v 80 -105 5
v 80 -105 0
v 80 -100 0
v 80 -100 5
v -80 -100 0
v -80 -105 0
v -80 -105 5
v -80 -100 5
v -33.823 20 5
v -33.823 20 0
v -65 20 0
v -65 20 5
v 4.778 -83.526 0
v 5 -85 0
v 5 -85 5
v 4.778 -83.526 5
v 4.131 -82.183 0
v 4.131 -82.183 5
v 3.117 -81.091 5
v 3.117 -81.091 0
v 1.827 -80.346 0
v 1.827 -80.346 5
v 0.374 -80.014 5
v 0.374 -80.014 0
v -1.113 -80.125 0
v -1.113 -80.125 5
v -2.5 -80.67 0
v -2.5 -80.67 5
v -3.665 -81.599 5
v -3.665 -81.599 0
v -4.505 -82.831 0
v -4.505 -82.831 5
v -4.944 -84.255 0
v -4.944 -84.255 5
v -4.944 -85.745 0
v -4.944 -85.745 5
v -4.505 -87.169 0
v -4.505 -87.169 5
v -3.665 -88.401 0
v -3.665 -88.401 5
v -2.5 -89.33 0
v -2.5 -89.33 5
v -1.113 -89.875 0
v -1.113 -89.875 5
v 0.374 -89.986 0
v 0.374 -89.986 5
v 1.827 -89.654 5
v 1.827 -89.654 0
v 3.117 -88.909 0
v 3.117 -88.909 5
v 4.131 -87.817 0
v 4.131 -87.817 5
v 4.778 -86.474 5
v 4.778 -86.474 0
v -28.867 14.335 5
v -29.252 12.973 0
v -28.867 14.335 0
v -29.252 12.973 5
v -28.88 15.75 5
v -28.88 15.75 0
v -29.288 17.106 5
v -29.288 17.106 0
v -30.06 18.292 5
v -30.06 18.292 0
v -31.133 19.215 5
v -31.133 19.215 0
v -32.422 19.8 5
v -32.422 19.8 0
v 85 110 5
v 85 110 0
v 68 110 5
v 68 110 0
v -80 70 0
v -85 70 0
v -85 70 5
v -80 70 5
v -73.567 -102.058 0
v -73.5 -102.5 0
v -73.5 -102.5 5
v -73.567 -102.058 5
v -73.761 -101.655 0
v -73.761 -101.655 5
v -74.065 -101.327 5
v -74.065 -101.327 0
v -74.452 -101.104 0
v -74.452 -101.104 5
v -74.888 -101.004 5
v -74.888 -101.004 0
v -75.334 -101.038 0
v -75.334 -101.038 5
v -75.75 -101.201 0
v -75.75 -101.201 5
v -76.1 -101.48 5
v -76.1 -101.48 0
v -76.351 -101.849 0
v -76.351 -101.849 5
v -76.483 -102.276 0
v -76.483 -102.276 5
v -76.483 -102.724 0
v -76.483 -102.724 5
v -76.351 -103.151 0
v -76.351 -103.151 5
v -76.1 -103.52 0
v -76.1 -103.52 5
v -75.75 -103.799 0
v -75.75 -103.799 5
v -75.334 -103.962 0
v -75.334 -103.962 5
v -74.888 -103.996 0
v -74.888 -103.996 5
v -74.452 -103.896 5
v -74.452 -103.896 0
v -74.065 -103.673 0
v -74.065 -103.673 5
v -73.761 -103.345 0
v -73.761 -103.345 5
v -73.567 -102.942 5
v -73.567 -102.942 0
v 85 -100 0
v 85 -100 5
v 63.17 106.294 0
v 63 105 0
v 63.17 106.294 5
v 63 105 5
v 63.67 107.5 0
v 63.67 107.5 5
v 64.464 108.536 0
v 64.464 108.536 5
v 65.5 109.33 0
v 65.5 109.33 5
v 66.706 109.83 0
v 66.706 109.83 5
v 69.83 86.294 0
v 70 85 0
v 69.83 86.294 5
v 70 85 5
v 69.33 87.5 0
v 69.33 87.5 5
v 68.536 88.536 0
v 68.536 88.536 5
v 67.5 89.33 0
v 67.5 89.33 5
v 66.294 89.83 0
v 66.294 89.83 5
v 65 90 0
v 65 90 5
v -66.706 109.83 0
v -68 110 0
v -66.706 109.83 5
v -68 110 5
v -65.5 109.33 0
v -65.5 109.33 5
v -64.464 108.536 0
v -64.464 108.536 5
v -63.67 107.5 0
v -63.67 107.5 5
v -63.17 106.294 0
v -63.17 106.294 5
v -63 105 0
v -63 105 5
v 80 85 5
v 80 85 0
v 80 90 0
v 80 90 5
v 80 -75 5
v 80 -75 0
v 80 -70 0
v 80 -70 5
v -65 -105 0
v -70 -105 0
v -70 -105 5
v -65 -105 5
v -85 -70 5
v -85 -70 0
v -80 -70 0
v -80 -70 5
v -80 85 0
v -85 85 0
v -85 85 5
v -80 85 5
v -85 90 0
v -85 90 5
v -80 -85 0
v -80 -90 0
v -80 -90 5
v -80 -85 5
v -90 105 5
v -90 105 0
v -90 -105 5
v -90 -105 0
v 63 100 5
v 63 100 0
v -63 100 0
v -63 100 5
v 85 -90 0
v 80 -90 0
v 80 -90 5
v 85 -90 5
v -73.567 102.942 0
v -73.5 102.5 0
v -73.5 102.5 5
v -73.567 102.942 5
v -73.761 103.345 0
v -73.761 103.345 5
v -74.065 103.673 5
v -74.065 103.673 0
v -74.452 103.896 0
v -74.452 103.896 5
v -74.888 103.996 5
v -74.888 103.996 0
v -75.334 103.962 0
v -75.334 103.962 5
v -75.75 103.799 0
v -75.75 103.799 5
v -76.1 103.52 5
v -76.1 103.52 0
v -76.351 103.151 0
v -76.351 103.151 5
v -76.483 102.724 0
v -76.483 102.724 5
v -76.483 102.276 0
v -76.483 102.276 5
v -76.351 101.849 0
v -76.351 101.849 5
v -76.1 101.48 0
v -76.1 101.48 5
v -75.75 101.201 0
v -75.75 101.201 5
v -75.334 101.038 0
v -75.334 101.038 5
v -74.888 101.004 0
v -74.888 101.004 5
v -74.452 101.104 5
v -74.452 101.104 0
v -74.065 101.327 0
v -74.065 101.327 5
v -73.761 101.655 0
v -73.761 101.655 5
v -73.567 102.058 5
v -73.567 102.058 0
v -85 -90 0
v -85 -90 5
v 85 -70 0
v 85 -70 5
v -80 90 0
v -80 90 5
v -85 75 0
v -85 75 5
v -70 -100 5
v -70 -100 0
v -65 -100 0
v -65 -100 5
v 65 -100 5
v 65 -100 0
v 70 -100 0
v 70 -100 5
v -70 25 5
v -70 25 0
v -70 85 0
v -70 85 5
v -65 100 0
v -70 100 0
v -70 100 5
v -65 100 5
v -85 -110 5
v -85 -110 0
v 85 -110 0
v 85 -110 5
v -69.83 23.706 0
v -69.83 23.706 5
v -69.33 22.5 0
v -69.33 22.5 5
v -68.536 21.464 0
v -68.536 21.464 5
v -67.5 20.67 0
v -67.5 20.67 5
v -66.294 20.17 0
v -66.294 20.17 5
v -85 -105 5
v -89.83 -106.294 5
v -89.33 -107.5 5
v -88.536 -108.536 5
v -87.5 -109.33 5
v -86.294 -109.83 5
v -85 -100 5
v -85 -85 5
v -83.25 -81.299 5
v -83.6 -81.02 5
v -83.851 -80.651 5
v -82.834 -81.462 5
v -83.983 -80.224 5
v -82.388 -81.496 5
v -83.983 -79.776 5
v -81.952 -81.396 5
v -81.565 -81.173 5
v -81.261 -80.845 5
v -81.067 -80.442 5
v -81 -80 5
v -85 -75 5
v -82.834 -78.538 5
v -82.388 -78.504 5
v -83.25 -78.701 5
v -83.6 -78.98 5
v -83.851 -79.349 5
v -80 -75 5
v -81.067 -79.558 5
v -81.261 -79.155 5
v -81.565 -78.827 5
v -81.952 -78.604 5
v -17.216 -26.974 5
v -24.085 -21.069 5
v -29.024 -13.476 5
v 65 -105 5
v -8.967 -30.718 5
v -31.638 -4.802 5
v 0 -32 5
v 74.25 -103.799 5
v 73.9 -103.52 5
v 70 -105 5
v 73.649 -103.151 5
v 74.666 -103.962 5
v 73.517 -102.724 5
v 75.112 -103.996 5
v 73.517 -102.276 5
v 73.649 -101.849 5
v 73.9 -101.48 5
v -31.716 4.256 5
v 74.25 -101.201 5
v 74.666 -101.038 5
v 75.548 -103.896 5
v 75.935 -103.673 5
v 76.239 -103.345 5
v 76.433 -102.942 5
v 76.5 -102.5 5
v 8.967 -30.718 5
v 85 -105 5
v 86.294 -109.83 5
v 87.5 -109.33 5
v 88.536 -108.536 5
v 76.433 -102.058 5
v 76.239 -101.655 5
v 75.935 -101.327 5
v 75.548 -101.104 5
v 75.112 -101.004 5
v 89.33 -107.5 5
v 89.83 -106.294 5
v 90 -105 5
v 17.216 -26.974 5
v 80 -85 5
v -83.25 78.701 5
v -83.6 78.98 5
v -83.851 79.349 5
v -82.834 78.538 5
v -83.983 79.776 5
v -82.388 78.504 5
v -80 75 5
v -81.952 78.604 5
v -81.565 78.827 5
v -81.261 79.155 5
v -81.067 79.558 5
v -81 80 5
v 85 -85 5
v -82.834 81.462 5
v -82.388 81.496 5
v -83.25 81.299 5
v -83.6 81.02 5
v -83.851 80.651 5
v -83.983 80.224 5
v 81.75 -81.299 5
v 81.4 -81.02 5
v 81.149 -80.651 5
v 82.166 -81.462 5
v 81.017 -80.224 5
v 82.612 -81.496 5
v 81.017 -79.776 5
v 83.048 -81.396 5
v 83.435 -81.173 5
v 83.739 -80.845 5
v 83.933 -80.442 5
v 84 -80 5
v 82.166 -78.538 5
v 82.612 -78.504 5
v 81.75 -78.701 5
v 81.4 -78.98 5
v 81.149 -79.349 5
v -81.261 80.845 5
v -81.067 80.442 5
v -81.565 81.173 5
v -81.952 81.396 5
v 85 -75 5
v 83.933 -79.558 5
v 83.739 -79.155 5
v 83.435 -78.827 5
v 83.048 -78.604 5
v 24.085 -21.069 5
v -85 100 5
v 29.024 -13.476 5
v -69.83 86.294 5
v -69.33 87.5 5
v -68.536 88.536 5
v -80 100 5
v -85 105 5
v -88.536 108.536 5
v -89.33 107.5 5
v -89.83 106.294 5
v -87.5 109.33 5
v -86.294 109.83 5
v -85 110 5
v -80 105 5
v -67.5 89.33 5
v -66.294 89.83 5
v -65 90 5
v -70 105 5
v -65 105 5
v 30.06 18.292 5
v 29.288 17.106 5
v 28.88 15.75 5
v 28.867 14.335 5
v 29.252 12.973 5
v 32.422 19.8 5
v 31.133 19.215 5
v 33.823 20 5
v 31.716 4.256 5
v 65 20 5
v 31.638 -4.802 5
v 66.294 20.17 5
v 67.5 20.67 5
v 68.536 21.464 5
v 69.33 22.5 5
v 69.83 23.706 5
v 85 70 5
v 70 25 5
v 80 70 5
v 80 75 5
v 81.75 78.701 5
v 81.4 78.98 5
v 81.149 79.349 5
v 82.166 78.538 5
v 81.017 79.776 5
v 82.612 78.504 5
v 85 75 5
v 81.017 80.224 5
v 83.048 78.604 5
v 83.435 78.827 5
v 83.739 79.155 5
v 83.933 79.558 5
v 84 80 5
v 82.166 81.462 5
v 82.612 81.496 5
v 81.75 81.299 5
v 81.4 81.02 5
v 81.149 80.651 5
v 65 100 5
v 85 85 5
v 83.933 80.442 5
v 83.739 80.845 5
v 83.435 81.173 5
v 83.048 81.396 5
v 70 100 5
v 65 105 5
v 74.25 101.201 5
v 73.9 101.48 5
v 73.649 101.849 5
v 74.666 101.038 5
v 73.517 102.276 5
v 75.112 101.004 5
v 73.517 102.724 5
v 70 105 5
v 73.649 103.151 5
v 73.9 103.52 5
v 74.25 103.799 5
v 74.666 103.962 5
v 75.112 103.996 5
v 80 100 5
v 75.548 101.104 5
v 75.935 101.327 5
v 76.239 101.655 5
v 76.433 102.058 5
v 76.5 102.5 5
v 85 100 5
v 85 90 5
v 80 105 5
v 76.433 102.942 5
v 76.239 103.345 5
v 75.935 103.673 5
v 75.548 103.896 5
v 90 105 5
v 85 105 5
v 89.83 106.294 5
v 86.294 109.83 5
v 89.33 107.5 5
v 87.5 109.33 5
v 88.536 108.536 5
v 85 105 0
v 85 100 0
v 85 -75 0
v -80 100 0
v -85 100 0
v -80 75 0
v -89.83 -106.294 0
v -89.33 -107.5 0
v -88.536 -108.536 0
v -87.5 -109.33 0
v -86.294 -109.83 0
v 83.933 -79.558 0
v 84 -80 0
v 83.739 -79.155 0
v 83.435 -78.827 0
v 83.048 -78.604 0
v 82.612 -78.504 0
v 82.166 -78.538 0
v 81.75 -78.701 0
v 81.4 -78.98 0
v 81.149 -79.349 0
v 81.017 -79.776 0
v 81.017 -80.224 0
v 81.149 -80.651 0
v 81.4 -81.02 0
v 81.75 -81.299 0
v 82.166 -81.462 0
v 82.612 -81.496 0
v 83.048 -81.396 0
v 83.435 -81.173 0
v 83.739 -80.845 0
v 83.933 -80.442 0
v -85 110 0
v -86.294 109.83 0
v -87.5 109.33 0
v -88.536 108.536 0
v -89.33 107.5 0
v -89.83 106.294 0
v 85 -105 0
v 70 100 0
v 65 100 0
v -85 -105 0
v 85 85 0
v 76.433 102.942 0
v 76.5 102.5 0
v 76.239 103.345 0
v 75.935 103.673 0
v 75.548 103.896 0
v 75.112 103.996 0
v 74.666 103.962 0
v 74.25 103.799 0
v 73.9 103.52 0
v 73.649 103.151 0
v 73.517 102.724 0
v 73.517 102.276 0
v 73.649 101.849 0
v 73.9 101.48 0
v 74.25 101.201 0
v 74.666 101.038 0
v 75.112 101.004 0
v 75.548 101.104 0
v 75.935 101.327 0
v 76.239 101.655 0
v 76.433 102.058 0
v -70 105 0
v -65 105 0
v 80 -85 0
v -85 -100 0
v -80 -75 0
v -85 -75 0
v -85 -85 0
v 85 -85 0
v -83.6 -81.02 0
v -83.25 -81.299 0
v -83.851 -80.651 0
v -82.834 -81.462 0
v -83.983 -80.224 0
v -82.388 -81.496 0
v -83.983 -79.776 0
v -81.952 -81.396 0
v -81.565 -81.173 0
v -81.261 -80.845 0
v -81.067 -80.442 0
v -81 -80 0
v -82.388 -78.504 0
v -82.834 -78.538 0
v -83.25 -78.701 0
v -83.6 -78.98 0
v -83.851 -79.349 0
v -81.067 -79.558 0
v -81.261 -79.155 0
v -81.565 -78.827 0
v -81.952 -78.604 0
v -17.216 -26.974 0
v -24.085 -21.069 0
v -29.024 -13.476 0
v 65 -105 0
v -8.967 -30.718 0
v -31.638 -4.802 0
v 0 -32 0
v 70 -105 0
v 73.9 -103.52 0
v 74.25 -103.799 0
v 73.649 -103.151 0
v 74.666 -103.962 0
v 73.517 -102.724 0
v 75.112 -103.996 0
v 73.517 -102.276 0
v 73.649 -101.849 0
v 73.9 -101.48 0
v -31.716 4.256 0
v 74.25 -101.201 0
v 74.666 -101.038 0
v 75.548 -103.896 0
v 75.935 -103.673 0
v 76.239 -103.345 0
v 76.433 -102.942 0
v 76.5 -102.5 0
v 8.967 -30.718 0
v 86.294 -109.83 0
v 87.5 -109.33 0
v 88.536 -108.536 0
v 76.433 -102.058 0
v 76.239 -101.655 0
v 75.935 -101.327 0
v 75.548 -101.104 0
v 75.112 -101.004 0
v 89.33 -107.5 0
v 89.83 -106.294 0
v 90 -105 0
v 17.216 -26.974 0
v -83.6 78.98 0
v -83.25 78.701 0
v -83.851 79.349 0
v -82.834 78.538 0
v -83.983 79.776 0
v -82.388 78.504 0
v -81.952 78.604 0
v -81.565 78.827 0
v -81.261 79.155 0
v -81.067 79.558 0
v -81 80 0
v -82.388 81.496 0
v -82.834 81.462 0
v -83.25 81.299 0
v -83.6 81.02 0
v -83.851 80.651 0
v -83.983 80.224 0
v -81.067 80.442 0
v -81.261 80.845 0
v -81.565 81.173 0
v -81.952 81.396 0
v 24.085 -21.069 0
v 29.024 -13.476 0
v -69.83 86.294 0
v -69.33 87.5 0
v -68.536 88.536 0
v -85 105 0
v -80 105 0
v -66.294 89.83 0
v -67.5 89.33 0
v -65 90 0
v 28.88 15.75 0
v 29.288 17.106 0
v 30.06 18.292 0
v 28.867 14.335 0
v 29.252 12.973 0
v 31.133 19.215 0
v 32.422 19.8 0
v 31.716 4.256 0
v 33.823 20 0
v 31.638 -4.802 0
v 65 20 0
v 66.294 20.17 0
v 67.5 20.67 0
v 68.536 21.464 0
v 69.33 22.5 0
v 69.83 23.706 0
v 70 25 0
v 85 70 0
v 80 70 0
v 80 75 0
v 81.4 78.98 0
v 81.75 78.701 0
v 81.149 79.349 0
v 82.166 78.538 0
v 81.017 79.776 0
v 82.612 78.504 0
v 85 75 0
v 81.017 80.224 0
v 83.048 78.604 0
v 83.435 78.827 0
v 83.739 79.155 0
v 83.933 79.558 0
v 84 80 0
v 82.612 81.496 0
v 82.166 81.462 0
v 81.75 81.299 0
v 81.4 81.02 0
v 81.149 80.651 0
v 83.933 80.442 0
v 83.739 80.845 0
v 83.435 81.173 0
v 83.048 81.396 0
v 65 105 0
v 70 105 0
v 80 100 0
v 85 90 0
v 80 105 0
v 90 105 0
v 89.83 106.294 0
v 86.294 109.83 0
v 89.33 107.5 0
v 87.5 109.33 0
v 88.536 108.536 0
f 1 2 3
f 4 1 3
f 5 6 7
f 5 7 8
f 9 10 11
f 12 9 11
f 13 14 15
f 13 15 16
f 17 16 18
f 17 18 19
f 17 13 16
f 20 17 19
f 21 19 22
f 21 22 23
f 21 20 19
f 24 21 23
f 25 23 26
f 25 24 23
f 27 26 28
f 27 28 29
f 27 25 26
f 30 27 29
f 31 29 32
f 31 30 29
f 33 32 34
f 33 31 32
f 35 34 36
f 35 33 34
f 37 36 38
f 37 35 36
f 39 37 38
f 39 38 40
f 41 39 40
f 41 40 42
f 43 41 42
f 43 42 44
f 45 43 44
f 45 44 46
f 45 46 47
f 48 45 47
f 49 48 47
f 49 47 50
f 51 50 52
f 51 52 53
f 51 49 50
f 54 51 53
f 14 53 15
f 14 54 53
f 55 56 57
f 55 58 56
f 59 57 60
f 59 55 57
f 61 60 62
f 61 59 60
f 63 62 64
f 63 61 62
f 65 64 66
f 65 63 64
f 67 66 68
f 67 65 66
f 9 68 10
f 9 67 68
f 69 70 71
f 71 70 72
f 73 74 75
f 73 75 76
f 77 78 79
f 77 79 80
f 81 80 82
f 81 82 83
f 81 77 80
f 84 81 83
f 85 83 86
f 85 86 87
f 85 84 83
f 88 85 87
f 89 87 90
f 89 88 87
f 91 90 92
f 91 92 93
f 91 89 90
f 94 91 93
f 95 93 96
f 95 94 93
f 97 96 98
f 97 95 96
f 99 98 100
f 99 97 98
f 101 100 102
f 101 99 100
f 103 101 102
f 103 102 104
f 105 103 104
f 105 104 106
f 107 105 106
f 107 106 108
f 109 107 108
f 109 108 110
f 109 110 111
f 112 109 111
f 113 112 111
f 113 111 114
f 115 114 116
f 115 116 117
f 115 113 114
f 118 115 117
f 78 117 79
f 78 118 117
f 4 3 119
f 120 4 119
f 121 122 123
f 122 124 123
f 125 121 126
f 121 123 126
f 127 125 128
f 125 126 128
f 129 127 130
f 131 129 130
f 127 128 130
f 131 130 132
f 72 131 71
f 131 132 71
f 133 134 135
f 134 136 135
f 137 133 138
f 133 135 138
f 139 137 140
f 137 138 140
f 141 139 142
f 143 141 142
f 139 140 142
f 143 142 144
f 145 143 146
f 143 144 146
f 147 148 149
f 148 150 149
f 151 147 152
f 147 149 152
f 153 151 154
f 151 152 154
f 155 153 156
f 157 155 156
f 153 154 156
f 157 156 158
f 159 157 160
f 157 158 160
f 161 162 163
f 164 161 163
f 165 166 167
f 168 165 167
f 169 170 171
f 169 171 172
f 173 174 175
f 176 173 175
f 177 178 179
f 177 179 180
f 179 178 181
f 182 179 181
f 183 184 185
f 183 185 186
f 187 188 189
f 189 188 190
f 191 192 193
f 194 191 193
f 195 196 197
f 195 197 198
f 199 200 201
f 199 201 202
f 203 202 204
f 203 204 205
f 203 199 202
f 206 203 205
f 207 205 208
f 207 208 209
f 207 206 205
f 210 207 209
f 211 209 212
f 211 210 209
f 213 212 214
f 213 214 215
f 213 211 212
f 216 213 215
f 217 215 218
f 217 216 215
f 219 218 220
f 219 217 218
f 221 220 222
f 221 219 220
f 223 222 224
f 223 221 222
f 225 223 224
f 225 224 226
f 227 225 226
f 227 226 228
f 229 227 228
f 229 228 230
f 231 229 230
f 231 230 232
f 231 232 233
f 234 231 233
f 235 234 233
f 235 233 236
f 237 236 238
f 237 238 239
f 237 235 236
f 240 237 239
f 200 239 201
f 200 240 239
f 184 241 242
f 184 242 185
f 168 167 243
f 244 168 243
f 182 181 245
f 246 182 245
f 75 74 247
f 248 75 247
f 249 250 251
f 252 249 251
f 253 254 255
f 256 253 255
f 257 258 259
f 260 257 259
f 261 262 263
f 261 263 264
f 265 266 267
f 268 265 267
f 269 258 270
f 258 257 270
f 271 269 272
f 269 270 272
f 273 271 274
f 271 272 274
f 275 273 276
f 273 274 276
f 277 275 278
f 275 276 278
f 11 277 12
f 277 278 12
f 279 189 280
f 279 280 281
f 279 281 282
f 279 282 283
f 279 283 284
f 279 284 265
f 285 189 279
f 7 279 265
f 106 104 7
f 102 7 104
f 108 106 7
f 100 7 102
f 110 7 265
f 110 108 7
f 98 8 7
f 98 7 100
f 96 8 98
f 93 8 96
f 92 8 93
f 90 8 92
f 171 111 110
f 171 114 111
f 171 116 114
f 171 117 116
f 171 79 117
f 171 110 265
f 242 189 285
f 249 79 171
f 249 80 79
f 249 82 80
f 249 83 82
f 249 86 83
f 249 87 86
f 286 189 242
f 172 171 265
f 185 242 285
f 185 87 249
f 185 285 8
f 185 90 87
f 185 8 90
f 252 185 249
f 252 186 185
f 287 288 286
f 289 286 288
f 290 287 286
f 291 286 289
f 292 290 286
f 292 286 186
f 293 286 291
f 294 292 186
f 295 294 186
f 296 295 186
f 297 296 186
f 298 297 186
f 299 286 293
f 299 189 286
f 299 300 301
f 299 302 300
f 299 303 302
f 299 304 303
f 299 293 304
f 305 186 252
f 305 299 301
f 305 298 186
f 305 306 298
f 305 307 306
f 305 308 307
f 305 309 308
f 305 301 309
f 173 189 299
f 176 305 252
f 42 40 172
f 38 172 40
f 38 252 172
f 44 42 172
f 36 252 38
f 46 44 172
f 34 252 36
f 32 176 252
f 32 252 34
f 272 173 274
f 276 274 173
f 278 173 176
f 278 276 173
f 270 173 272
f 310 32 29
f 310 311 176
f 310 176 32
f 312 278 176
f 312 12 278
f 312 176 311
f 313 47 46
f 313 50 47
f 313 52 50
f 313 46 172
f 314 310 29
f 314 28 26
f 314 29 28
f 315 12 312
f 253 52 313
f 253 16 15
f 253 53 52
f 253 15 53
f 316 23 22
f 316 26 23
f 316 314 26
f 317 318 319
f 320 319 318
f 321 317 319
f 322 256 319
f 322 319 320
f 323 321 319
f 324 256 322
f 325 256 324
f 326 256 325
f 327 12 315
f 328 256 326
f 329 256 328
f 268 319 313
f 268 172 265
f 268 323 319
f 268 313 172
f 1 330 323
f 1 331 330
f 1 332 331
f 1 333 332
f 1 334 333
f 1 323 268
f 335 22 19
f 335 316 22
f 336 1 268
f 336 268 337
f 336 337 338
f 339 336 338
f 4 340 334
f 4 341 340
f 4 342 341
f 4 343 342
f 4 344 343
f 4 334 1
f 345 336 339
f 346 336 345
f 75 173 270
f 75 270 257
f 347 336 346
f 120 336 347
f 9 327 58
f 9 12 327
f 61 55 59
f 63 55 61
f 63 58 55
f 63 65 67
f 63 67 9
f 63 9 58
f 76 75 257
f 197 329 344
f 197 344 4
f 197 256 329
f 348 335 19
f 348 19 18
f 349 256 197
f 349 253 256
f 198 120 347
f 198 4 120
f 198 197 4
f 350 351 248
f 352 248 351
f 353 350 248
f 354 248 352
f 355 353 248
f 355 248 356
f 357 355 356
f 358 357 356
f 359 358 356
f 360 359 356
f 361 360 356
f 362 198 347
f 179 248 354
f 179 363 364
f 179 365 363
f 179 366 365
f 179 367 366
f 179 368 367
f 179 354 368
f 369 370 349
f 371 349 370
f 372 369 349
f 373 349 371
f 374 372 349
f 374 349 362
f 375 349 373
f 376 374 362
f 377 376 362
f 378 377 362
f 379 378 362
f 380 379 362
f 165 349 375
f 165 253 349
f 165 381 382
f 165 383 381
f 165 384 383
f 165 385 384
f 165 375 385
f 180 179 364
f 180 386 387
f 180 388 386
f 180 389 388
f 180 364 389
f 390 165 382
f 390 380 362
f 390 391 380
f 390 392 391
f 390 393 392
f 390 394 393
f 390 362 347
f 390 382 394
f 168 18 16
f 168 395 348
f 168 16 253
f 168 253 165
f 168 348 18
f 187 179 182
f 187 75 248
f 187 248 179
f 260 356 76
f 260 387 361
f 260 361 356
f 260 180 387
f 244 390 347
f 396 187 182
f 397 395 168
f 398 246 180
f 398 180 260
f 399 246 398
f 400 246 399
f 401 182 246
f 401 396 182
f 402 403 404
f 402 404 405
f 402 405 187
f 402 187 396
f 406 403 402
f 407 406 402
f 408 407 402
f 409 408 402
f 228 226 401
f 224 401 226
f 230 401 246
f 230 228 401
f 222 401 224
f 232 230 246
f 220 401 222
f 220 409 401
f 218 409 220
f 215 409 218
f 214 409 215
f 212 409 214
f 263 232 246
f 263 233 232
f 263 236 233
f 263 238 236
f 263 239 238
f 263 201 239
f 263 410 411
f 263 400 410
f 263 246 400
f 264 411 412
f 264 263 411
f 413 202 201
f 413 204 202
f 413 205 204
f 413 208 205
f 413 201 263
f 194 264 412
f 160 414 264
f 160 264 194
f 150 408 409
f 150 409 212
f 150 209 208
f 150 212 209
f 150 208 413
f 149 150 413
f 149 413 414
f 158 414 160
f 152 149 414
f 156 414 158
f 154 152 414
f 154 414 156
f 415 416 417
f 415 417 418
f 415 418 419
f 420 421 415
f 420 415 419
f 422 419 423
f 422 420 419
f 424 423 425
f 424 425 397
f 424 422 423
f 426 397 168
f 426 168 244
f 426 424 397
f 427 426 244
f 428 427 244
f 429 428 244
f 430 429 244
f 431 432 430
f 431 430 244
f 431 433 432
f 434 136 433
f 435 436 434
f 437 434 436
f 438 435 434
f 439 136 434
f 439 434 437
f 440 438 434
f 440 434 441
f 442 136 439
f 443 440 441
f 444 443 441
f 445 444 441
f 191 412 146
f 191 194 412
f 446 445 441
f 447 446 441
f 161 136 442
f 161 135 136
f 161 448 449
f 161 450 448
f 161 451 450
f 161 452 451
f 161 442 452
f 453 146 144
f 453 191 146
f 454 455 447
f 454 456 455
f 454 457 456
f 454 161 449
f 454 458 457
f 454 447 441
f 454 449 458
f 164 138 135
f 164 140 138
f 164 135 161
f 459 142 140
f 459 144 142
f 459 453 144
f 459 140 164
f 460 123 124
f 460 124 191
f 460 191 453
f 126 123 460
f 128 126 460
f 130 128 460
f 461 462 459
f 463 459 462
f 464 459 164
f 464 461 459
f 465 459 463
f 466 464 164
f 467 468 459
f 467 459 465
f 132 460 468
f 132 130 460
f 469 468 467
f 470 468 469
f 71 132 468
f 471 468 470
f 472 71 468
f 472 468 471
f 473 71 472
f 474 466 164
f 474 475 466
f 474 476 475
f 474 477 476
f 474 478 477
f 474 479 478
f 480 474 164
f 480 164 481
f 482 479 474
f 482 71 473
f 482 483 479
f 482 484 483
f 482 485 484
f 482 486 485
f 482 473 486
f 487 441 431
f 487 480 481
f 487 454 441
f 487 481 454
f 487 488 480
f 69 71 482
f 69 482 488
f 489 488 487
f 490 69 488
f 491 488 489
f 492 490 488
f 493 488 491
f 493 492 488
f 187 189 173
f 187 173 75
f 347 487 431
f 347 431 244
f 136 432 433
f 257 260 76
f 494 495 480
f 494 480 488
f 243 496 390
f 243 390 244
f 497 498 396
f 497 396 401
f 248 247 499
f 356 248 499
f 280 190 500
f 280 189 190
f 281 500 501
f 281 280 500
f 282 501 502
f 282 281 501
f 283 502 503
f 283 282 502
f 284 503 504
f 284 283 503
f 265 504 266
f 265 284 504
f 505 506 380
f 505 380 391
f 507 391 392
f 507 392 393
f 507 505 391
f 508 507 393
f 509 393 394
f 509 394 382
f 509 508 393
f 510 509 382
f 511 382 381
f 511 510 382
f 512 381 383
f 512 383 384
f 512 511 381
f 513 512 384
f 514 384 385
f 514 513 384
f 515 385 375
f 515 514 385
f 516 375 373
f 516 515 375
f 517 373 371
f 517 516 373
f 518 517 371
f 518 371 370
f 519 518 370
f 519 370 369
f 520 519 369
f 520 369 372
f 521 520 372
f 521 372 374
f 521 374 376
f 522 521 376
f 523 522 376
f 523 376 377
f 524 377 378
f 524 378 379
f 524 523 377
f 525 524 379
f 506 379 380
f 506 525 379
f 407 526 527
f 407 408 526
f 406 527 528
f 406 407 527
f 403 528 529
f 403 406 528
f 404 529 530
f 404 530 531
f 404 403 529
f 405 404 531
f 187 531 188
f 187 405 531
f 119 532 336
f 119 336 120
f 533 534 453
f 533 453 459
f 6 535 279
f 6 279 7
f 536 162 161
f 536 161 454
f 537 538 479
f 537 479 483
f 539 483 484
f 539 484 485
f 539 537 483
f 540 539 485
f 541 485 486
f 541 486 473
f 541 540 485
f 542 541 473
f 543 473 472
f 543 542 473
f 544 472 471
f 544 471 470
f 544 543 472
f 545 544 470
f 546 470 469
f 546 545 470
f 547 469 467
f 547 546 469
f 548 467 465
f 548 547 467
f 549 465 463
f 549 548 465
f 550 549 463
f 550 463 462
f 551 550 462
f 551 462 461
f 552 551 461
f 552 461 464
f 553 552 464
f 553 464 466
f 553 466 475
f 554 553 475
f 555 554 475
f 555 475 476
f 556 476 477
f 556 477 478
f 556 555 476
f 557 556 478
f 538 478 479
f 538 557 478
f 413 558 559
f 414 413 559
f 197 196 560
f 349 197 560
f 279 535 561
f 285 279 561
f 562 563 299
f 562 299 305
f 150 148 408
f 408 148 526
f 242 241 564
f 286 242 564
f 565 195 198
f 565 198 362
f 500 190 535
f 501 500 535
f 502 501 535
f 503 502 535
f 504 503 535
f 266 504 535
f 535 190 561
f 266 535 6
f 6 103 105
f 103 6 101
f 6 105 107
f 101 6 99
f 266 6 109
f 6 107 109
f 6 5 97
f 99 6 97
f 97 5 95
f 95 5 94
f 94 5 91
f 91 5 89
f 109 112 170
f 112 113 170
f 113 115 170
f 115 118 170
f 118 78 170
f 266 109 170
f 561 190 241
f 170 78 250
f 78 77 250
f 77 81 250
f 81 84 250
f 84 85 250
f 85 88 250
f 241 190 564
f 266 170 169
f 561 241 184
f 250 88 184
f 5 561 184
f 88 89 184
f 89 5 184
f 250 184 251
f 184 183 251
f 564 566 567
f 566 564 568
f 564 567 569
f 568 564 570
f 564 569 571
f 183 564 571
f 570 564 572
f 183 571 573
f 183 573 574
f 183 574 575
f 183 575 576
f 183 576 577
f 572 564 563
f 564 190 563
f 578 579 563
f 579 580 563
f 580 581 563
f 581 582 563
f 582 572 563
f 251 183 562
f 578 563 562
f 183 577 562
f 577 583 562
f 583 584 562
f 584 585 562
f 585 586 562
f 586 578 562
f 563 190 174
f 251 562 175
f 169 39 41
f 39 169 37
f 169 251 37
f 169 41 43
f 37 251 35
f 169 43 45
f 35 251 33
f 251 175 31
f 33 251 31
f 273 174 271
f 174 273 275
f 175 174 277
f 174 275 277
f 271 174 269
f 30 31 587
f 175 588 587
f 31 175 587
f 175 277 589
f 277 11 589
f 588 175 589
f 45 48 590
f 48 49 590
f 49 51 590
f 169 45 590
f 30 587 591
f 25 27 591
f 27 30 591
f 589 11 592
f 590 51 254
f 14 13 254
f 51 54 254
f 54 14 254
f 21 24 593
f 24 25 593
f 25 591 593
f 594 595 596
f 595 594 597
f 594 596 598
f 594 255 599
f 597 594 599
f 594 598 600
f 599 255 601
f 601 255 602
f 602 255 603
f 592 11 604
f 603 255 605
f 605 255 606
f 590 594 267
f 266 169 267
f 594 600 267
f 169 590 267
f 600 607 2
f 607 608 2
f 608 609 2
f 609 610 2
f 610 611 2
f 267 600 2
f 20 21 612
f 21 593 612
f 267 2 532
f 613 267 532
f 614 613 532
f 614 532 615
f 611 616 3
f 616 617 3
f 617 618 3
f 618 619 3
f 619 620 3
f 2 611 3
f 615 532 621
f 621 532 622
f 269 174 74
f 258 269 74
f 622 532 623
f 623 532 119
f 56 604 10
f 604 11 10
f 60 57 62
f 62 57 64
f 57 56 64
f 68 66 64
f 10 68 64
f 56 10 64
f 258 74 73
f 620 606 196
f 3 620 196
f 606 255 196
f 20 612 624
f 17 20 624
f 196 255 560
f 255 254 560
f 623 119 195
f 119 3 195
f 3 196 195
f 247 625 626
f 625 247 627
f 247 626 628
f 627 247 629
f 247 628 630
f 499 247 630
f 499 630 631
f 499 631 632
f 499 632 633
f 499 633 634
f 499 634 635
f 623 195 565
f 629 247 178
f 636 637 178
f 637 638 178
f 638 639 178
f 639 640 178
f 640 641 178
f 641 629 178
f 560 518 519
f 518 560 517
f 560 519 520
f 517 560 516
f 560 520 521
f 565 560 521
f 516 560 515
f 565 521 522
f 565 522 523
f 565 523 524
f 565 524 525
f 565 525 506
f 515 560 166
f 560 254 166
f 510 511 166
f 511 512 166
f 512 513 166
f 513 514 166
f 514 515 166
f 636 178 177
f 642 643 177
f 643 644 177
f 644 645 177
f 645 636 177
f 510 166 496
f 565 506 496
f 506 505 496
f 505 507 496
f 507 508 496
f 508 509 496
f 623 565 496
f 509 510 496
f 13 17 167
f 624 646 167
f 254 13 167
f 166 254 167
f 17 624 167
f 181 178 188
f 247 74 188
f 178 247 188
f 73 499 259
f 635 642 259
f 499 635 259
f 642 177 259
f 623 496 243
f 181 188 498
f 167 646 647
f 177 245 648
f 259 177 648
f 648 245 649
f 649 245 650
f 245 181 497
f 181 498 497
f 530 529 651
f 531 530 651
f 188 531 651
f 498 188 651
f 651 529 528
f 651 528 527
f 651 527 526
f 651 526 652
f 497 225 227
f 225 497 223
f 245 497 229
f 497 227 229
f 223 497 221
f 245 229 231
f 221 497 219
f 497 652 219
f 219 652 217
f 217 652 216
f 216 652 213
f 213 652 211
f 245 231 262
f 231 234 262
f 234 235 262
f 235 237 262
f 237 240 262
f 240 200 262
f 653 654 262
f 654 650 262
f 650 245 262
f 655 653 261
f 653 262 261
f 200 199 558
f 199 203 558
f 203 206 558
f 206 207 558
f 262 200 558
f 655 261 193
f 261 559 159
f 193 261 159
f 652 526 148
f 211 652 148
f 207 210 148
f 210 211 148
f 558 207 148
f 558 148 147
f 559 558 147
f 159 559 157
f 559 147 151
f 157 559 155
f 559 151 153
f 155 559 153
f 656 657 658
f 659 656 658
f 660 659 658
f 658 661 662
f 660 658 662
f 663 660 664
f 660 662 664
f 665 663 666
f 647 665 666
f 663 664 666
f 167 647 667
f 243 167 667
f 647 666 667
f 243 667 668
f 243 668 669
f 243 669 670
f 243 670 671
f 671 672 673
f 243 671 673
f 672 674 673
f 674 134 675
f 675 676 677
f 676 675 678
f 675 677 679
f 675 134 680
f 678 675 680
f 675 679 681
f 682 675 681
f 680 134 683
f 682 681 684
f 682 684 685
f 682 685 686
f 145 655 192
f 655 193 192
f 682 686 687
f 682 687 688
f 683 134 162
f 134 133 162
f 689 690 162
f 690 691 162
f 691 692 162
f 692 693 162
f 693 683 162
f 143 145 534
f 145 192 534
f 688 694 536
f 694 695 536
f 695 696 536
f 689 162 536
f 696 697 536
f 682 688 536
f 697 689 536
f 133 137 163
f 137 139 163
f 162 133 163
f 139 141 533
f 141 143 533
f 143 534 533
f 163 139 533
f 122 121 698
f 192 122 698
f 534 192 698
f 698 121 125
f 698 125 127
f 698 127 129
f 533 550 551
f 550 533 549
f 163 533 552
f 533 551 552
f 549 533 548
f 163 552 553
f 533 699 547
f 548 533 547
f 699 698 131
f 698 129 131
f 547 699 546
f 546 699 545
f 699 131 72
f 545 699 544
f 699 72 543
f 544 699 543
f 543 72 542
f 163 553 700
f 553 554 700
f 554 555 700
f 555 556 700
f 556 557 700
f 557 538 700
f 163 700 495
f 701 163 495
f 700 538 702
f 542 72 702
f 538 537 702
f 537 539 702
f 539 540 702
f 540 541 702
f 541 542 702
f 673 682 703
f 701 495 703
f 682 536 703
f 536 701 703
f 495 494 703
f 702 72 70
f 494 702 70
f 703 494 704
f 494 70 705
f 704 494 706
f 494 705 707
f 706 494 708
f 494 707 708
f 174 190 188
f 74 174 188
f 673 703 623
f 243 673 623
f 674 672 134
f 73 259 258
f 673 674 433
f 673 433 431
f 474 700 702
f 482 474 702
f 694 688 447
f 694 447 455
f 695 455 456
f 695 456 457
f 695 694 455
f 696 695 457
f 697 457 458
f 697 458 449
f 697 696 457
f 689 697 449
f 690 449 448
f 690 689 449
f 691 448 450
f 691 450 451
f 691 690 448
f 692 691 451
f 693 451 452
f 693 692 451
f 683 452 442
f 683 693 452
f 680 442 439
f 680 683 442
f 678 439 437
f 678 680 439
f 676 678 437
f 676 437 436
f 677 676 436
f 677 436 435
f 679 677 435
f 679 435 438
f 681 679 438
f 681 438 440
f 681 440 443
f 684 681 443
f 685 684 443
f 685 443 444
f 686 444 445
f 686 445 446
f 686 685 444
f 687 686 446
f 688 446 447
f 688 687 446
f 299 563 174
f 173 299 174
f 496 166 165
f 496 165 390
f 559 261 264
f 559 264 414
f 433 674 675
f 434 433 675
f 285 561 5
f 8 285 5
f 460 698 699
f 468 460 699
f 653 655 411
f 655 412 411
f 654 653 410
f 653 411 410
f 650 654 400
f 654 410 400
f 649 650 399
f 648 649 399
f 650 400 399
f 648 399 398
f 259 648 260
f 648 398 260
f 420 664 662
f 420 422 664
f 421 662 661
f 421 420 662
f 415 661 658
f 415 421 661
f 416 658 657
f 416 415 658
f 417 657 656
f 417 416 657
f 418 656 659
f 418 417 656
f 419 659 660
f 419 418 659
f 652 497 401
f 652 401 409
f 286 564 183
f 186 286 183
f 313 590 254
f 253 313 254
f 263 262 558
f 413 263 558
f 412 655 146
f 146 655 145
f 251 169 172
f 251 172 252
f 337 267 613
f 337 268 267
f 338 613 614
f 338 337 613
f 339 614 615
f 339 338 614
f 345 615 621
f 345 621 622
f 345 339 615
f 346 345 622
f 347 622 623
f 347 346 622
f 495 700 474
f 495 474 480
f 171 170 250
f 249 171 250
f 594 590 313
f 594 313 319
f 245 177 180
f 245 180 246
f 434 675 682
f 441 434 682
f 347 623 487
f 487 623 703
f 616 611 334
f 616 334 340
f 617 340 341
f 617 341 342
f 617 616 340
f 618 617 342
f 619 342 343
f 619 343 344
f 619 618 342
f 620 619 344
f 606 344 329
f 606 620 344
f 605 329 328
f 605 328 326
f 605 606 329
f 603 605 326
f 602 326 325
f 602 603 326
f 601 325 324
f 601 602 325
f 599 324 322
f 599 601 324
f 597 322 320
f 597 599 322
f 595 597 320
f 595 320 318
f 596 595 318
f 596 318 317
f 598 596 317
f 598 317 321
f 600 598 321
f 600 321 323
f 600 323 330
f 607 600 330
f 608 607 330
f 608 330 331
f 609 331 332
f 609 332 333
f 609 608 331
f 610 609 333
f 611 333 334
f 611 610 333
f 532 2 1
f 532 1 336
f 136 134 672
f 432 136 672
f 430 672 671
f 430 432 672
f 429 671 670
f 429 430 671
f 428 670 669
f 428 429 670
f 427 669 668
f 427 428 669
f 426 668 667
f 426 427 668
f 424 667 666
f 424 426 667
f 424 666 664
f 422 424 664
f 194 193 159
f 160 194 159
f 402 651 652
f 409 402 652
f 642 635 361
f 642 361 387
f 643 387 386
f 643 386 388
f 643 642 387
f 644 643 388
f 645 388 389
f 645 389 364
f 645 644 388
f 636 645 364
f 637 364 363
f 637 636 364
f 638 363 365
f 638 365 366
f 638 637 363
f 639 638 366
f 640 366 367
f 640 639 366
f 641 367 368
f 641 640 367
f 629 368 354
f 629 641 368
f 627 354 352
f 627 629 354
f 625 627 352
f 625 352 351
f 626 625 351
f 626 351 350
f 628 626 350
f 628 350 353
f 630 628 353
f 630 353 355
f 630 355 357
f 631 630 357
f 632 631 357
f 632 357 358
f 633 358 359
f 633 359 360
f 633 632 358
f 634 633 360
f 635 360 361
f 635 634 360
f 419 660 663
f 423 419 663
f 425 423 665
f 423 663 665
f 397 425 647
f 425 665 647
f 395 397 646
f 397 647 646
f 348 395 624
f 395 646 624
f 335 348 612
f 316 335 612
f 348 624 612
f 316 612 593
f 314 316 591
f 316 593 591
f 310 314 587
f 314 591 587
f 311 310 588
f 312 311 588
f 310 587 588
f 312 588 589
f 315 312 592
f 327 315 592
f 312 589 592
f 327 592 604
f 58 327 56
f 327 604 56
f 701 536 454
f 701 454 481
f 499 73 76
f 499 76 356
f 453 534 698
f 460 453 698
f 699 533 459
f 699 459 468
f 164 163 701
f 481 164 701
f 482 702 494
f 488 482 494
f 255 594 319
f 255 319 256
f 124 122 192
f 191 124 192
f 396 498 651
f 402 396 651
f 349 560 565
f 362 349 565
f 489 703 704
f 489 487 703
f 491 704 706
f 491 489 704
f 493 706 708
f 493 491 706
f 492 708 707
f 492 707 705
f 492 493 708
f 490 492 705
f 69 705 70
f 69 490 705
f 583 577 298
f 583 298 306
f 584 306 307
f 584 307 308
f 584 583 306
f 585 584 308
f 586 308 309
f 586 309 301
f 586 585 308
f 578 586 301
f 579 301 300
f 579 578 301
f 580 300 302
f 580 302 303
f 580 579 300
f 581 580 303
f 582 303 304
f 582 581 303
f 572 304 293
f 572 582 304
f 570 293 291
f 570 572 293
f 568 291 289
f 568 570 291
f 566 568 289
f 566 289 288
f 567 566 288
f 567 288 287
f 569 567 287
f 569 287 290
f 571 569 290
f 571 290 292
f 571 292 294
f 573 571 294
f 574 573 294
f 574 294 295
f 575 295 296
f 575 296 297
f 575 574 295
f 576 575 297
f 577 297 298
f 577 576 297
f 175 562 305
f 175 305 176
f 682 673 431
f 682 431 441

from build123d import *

# Parameters (mm, degrees)
BOSS_EXTRUDE1_OUTLINE_W   = 5
BOSS_EXTRUDE1_OUTLINE_H   = 5
BOSS_EXTRUDE1_OUTLINE_R   = 1.5
BOSS_EXTRUDE1_OUTLINE_R_2 = 5
BOSS_EXTRUDE1_DEPTH       = 5
FILLET1_R                 = 5


# Read off the part's stored shape, not the designer's step: Boss-Extrude1
with BuildPart() as part:
    # Boss-Extrude1 outline → Boss-Extrude1 (new body)
    with BuildSketch(Plane.XY):
        Polygon((-63, 110), (-90, 110), (-90, -110), (90, -110), (90, 110), (63, 110), (63, 100), (-63, 100), align=None)
        with Locations((-82.5, -102.5)):
            Rectangle(BOSS_EXTRUDE1_OUTLINE_W, BOSS_EXTRUDE1_OUTLINE_H, mode=Mode.SUBTRACT)
        with Locations((-75, -102.5)):
            Circle(BOSS_EXTRUDE1_OUTLINE_R, mode=Mode.SUBTRACT)
        with Locations((-82.5, -87.5)):
            Rectangle(BOSS_EXTRUDE1_OUTLINE_W, BOSS_EXTRUDE1_OUTLINE_H, mode=Mode.SUBTRACT)
        with Locations((-67.5, -102.5)):
            Rectangle(BOSS_EXTRUDE1_OUTLINE_W, BOSS_EXTRUDE1_OUTLINE_H, mode=Mode.SUBTRACT)
        with Locations((-82.5, -80)):
            Circle(BOSS_EXTRUDE1_OUTLINE_R, mode=Mode.SUBTRACT)
        with Locations((-82.5, -72.5)):
            Rectangle(BOSS_EXTRUDE1_OUTLINE_W, BOSS_EXTRUDE1_OUTLINE_H, mode=Mode.SUBTRACT)
        with Locations((0, -85)):
            Circle(BOSS_EXTRUDE1_OUTLINE_R_2, mode=Mode.SUBTRACT)
        with Locations((67.5, -102.5)):
            Rectangle(BOSS_EXTRUDE1_OUTLINE_W, BOSS_EXTRUDE1_OUTLINE_H, mode=Mode.SUBTRACT)
        with Locations((75, -102.5)):
            Circle(BOSS_EXTRUDE1_OUTLINE_R, mode=Mode.SUBTRACT)
        with Locations((82.5, -102.5)):
            Rectangle(BOSS_EXTRUDE1_OUTLINE_W, BOSS_EXTRUDE1_OUTLINE_H, mode=Mode.SUBTRACT)
        with Locations((82.5, -87.5)):
            Rectangle(BOSS_EXTRUDE1_OUTLINE_W, BOSS_EXTRUDE1_OUTLINE_H, mode=Mode.SUBTRACT)
        with Locations((82.5, -80)):
            Circle(BOSS_EXTRUDE1_OUTLINE_R, mode=Mode.SUBTRACT)
        with Locations((82.5, -72.5)):
            Rectangle(BOSS_EXTRUDE1_OUTLINE_W, BOSS_EXTRUDE1_OUTLINE_H, mode=Mode.SUBTRACT)
        with Locations((-82.5, 72.5)):
            Rectangle(BOSS_EXTRUDE1_OUTLINE_W, BOSS_EXTRUDE1_OUTLINE_H, mode=Mode.SUBTRACT)
        with Locations((-82.5, 80)):
            Circle(BOSS_EXTRUDE1_OUTLINE_R, mode=Mode.SUBTRACT)
        with Locations((-82.5, 87.5)):
            Rectangle(BOSS_EXTRUDE1_OUTLINE_W, BOSS_EXTRUDE1_OUTLINE_H, mode=Mode.SUBTRACT)
        with Locations((-82.5, 102.5)):
            Rectangle(BOSS_EXTRUDE1_OUTLINE_W, BOSS_EXTRUDE1_OUTLINE_H, mode=Mode.SUBTRACT)
        with Locations((-75, 102.5)):
            Circle(BOSS_EXTRUDE1_OUTLINE_R, mode=Mode.SUBTRACT)
        with Locations((-67.5, 102.5)):
            Rectangle(BOSS_EXTRUDE1_OUTLINE_W, BOSS_EXTRUDE1_OUTLINE_H, mode=Mode.SUBTRACT)
        with BuildLine():
            Line((70, 20), (24.979991994, 20))
            ThreePointArc((24.979991994, 20), (0, -32), (-24.979991994, 20))
            Line((-24.979991994, 20), (-70, 20))
            Line((-70, 20), (-70, 90))
            Line((-70, 90), (70, 90))
            Line((70, 90), (70, 20))
        make_face(mode=Mode.SUBTRACT)
        with Locations((82.5, 72.5)):
            Rectangle(BOSS_EXTRUDE1_OUTLINE_W, BOSS_EXTRUDE1_OUTLINE_H, mode=Mode.SUBTRACT)
        with Locations((82.5, 80)):
            Circle(BOSS_EXTRUDE1_OUTLINE_R, mode=Mode.SUBTRACT)
        with Locations((82.5, 87.5)):
            Rectangle(BOSS_EXTRUDE1_OUTLINE_W, BOSS_EXTRUDE1_OUTLINE_H, mode=Mode.SUBTRACT)
        with Locations((67.5, 102.5)):
            Rectangle(BOSS_EXTRUDE1_OUTLINE_W, BOSS_EXTRUDE1_OUTLINE_H, mode=Mode.SUBTRACT)
        with Locations((75, 102.5)):
            Circle(BOSS_EXTRUDE1_OUTLINE_R, mode=Mode.SUBTRACT)
        with Locations((82.5, 102.5)):
            Rectangle(BOSS_EXTRUDE1_OUTLINE_W, BOSS_EXTRUDE1_OUTLINE_H, mode=Mode.SUBTRACT)
    extrude(amount=BOSS_EXTRUDE1_DEPTH)

    # Fillet1
    fillet1_edges = [part.edges().sort_by_distance(p)[0] for p in [
        (-63, 110, 2.5),
        (63, 110, 2.5),
        (90, 110, 2.5),
        (90, -110, 2.5),
        (-90, -110, 2.5),
        (-90, 110, 2.5),
        (-24.979991994, 20, 2.5),
        (24.979991994, 20, 2.5),
        (70, 20, 2.5),
        (70, 90, 2.5),
        (-70, 90, 2.5),
        (-70, 20, 2.5),
    ]]
    fillet(fillet1_edges, radius=FILLET1_R)


solid = part.part
